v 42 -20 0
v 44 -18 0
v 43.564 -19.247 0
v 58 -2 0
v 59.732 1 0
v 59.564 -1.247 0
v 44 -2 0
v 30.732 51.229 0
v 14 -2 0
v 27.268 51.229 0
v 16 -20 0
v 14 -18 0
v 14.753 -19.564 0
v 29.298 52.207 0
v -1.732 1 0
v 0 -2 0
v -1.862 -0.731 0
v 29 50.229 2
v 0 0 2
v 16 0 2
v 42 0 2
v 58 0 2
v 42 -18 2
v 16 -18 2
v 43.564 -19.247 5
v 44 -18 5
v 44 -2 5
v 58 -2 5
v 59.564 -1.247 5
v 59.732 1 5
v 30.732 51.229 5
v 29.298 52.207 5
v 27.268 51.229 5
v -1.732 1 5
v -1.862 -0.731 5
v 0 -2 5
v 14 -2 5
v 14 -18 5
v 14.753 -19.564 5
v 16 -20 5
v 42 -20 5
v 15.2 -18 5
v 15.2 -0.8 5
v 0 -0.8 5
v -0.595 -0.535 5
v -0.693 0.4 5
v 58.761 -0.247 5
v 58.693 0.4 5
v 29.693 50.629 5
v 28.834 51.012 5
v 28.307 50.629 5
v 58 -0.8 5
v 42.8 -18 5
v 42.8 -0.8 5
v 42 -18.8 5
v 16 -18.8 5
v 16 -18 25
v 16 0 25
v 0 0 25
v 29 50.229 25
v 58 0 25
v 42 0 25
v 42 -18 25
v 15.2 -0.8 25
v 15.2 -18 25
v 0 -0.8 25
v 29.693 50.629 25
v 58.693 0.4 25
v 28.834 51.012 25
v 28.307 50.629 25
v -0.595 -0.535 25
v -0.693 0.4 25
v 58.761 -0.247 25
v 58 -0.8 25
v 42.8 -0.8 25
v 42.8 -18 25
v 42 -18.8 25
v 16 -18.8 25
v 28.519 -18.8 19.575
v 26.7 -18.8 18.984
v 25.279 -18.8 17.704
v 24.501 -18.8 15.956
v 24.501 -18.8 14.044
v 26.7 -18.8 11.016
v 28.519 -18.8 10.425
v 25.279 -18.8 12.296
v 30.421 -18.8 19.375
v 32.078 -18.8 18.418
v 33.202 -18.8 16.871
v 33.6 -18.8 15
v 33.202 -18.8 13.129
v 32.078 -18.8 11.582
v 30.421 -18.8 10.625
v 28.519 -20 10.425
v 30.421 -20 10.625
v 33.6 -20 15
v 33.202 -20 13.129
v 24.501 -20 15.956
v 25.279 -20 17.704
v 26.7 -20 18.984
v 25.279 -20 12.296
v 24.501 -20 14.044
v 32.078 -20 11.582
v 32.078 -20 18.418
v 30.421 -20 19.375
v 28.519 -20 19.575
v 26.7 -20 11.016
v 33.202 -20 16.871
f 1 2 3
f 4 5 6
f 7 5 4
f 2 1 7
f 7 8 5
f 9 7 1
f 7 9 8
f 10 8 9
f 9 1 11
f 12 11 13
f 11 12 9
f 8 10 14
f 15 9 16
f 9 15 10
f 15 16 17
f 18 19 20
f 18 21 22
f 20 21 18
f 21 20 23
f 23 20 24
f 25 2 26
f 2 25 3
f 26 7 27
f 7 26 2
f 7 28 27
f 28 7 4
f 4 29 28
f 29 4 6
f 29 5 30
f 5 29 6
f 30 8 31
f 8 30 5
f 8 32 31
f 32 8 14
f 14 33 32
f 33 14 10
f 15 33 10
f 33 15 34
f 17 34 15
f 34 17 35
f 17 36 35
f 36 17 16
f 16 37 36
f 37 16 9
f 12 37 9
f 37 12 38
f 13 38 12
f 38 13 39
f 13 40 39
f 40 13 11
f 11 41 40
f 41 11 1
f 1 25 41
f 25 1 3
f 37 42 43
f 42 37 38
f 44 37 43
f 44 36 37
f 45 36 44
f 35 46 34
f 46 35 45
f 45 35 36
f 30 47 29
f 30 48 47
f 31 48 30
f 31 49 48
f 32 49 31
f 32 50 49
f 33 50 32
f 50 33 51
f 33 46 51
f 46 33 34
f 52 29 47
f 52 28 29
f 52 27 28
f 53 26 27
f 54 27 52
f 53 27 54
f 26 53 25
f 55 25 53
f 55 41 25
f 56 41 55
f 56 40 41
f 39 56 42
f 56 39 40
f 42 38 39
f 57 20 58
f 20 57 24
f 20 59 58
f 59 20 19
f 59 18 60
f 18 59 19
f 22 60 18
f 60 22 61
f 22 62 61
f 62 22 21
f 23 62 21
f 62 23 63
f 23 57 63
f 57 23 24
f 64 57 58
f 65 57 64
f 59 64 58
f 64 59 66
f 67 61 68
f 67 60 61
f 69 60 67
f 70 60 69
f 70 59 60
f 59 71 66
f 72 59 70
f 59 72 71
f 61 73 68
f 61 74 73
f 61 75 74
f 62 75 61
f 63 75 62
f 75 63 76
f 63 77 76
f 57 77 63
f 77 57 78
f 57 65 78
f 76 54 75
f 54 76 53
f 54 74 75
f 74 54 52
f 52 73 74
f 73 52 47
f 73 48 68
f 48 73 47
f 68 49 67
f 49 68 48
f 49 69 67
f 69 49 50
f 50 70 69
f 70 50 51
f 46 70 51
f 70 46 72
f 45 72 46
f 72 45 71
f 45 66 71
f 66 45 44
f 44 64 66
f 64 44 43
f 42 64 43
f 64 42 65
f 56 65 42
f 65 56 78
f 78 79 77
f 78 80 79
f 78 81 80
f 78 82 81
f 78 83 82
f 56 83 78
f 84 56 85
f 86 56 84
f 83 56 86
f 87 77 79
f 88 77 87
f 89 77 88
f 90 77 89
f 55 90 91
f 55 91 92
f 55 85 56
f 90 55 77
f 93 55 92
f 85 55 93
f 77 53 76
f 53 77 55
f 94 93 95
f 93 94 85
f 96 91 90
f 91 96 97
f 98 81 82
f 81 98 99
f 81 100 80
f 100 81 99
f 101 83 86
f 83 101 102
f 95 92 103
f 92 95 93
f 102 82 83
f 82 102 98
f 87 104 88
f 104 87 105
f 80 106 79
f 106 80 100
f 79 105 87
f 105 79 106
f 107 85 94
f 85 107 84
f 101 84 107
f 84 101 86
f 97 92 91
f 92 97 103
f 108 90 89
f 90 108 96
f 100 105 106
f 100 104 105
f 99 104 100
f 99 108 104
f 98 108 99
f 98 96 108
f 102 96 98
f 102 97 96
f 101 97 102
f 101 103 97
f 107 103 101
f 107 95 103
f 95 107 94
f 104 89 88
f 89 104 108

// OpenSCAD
// file: SnapContainer.scad
tolerance = 0.4;

module container_shape(width, box_width, box_depth) {
    polygon([[0,0], [width,0], [width/2,sin(60) * width]]);
    center_align_offset =  (width-box_width)/2;
    polygon([
        [center_align_offset,0],
        [width-center_align_offset,0],
        [width-center_align_offset,-box_depth],
        [center_align_offset,-box_depth]
    ]);
}

module triangle_container(width, height, box_width, box_depth, wall_thickness=2) {
	linear_extrude(wall_thickness) {
        offset(wall_thickness) {
            container_shape(width, box_width, box_depth);
        }
	}

    translate([0,0,wall_thickness]) {
        linear_extrude(height-wall_thickness) {
            difference() {
                offset(wall_thickness) {
                    container_shape(width, box_width, box_depth);
                }
                container_shape(width, box_width, box_depth);
            }
        }
    }
}

module triangle_container_case(width, height, box_width=0, box_depth=0, box_height=0, wall_thickness=2, overlap = 20) {
	
	triangle_container(width, height-overlap, box_width, box_depth, wall_thickness);
    linear_extrude(height-box_height) {
        center_align_offset =  (width-box_width)/2;
        polygon([
            [center_align_offset,0],
            [width-center_align_offset,0],
            [width-center_align_offset,-box_depth],
            [center_align_offset,-box_depth]
        ]);
    }

	translate([0,0,height-overlap]) {
		linear_extrude(overlap) {
			difference() {
				offset(wall_thickness/2 - tolerance/2) {
					container_shape(width, box_width, box_depth);
				}
				container_shape(width, box_width, box_depth);
				
			}
		}
        translate([width/2,-box_depth,overlap/2]) {
            rotate([90,0,0]) linear_extrude(wall_thickness) circle(5 - tolerance);
        }
	}
}

module triangle_container_lid(width, height, box_width=0, box_depth=0, wall_thickness=2, overlap = 20) {

	triangle_container(width, height, box_width, box_depth, wall_thickness);
	translate([0,0,height]) {
        difference() {
            linear_extrude(overlap) {
                difference() {
                    offset(wall_thickness) {
                        container_shape(width, box_width, box_depth);
                    }
                    offset(wall_thickness/2 + tolerance/2)
                    container_shape(width, box_width, box_depth);
                }
            }
            translate([width/2,-box_depth,overlap/2]) {
                rotate([90,0,0]) linear_extrude(wall_thickness+3) circle(5);
            }
        }
	}
}




width = 26;
height = 25;
box_width = 0;
box_depth = 0;
box_height = 0;
lid_height = 5;

// Case
triangle_container_case(width, height, box_width, box_depth, 
box_height - lid_height, 2, 20);

//Lid
translate([width + 20, 0, 0])
triangle_container_lid(width, lid_height, box_width, box_depth,
 2, 20);
// main file
use <SnapContainer.scad>;

module incut(incut_width, incut_height, incut_offset) {
    translate([-10,5, incut_height/2 + 7 + 2]) {
        rotate([0,90,0]) {
            linear_extrude(width + 15) {
                polygon([[0,0],[incut_width,0],[0,incut_height/2]]);
                polygon([[incut_width + incut_offset,incut_offset],[incut_width + incut_offset,incut_height/2 + incut_offset],[incut_offset,incut_height/2 + incut_offset]]); 
                mirror([1,0,0]) {
                    polygon([[0,0],[incut_width,0],[0,incut_height/2]]);
                    polygon([[incut_width + incut_offset,incut_offset],[incut_width + incut_offset,incut_height/2 + incut_offset],[incut_offset,incut_height/2 + incut_offset]]); 
                }
            }
        }
    }
}

width = 58;
height = 30;
box_width = 26;
box_depth = 18;
box_height = 85;
lid_height = 5;

// Case
difference() {
    triangle_container_case(width, height - lid_height, box_width, box_depth, box_height - lid_height, 2, 20);
    //incut(30, 70, 5);
}

//Lid
//translate([width + 20, 0, 0])
//triangle_container_lid(width, lid_height, box_width, box_depth, 2, 20);
